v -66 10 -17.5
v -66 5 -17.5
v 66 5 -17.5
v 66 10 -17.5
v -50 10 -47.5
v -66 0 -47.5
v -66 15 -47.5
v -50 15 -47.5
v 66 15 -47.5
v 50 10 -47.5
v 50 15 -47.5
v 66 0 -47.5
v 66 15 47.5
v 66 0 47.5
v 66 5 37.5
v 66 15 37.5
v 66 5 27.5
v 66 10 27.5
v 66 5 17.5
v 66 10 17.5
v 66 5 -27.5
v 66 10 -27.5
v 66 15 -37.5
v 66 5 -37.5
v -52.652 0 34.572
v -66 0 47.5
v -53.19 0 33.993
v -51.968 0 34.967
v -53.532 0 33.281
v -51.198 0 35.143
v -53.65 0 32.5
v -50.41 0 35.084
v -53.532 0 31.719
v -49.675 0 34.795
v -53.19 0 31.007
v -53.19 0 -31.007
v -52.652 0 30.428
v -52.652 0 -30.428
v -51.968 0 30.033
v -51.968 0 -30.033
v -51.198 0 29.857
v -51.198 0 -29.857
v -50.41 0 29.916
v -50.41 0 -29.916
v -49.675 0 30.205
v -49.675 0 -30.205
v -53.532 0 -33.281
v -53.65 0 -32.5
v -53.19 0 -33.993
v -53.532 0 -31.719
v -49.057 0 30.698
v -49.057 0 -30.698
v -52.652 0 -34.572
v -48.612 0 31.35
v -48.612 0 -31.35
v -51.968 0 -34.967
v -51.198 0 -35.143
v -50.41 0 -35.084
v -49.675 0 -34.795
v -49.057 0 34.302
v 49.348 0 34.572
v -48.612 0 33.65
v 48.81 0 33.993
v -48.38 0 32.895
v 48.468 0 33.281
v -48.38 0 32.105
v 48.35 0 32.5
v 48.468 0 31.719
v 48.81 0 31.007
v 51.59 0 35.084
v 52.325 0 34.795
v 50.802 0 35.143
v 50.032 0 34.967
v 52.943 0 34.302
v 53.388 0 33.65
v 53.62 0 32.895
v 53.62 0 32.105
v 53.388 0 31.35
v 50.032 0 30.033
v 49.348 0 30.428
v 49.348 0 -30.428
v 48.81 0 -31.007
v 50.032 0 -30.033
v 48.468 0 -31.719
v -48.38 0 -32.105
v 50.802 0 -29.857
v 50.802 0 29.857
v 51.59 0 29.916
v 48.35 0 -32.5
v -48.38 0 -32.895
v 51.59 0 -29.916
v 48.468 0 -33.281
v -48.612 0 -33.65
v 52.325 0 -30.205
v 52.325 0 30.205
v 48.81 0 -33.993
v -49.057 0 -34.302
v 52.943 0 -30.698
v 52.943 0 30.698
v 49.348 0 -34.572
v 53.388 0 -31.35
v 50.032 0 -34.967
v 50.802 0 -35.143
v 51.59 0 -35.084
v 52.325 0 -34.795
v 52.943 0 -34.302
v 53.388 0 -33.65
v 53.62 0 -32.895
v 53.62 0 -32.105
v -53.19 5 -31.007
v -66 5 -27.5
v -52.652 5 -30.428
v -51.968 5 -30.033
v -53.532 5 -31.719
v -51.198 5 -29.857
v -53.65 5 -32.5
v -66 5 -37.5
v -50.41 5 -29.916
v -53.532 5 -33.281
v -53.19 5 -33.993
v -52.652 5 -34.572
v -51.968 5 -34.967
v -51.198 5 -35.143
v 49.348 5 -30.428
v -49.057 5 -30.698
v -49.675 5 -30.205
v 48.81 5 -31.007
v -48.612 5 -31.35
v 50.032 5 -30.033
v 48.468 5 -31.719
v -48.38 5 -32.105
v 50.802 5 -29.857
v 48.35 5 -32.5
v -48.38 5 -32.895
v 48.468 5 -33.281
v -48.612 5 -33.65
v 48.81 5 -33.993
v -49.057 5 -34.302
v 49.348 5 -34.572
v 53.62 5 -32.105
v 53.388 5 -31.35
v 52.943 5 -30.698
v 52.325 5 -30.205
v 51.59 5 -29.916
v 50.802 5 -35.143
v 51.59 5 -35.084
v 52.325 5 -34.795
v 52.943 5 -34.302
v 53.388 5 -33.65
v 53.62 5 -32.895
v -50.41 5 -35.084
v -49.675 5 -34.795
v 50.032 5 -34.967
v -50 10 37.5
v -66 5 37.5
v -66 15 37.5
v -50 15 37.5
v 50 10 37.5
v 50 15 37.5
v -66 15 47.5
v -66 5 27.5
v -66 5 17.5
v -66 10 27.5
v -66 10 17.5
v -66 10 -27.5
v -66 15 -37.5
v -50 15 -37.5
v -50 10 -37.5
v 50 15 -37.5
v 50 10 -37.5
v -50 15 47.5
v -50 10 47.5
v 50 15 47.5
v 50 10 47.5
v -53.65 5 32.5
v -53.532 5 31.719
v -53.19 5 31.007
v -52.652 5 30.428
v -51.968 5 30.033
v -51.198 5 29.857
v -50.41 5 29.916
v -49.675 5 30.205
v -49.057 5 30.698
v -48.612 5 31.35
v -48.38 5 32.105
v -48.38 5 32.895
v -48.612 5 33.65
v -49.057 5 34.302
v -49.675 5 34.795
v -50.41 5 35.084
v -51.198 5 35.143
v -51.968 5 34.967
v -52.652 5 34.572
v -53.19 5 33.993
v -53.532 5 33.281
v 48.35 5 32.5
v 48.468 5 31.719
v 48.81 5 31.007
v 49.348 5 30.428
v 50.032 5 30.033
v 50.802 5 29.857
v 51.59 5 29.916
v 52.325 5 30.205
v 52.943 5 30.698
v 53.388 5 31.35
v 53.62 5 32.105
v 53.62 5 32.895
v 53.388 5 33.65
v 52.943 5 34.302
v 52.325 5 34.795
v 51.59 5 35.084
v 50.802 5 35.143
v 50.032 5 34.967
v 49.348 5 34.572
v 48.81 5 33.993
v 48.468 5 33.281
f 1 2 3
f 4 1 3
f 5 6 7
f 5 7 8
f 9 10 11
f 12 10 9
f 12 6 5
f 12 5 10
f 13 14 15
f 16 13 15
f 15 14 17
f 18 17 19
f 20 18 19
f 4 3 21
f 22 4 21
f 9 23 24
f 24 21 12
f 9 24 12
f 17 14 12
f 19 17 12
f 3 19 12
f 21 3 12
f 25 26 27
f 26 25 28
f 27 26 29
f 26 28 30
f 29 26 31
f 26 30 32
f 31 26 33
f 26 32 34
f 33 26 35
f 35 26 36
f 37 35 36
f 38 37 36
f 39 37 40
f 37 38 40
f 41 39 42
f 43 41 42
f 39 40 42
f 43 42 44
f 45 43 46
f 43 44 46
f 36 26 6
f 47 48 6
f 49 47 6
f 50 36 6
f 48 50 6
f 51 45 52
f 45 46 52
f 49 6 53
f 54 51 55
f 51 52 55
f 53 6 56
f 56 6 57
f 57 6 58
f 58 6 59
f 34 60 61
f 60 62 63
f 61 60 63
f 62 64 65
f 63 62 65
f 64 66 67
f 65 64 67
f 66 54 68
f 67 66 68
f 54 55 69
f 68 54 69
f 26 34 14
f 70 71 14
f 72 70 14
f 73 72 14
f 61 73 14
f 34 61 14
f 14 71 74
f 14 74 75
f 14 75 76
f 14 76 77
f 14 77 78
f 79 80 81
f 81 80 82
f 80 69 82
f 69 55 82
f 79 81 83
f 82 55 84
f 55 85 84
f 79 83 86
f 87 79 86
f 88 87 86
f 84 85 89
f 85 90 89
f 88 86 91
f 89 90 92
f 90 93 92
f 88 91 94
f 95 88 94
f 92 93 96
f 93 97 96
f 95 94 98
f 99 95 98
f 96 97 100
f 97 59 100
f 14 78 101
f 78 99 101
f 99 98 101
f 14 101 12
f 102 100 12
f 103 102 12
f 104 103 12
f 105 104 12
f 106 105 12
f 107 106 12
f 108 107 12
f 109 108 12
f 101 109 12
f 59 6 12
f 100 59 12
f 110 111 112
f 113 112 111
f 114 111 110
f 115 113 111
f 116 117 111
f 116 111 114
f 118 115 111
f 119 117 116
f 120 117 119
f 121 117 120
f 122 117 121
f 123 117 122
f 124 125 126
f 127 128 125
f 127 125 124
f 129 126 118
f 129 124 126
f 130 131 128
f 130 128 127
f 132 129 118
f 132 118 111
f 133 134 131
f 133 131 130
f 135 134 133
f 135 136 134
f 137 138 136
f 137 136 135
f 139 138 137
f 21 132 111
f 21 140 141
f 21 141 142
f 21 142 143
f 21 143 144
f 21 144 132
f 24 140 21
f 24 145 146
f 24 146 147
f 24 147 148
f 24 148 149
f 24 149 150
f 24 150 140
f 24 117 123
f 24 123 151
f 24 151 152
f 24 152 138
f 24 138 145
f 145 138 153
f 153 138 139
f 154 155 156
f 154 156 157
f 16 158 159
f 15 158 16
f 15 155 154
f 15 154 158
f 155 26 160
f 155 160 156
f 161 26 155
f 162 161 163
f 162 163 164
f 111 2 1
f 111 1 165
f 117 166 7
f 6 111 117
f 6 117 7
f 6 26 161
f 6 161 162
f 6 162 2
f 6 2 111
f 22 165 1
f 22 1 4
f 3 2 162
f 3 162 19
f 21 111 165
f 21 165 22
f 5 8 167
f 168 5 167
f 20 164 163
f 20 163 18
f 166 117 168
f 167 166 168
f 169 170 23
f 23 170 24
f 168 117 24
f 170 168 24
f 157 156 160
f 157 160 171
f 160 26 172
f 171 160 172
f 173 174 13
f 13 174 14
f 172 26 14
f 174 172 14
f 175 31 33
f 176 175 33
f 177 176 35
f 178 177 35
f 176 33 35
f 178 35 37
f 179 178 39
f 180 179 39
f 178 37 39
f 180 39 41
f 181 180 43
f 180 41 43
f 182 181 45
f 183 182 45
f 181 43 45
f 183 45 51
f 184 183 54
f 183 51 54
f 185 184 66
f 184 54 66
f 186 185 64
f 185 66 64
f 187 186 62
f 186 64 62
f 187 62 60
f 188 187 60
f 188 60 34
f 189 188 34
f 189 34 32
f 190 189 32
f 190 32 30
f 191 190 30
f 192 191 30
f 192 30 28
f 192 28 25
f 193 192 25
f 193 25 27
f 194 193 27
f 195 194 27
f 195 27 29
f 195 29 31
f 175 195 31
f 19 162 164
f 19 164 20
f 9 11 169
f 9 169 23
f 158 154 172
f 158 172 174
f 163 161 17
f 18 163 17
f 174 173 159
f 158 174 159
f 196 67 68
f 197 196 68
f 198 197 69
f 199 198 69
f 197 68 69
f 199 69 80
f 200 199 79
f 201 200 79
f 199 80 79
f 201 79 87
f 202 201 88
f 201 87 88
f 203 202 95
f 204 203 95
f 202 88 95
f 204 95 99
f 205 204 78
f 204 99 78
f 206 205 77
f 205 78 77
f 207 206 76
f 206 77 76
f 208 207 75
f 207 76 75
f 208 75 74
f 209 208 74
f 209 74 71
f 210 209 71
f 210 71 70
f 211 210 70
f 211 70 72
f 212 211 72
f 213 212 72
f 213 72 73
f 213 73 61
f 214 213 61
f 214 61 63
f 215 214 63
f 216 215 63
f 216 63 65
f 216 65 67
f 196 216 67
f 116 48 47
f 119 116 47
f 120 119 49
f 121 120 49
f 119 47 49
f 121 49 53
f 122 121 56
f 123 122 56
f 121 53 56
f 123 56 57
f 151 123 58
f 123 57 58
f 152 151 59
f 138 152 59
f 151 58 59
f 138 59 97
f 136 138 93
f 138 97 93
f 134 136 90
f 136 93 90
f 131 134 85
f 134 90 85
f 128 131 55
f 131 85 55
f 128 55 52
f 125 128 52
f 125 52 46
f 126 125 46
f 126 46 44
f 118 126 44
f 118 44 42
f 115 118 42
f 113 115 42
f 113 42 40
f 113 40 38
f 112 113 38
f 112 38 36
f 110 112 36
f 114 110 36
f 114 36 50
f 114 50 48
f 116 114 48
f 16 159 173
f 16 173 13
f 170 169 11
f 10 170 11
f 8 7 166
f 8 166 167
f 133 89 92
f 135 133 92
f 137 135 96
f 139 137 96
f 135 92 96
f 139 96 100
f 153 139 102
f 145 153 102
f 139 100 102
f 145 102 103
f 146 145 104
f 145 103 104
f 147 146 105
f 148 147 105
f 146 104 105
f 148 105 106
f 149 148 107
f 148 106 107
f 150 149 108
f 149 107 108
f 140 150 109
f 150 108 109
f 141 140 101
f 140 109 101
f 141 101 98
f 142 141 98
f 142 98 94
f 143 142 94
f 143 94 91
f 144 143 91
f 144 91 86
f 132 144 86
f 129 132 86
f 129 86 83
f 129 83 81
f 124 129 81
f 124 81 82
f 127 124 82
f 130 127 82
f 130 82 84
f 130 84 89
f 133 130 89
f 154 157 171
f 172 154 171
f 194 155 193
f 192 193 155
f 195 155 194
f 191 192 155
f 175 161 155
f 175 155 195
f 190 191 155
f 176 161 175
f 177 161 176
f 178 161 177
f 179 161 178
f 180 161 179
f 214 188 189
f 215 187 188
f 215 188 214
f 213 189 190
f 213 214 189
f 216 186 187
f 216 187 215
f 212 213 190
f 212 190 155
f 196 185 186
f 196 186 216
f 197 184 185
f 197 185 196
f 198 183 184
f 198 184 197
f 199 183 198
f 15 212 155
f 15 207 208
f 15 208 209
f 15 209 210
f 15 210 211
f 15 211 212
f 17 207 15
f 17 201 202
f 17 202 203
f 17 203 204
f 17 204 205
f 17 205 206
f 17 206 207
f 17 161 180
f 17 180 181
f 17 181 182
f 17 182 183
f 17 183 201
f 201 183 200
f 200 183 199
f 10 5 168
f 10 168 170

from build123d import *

# Parameters (mm, degrees)
SKETCH1_W            = 132
SKETCH1_H            = 95
BOSS_EXTRUDE1_DEPTH  = 5
M5_CLEARANCE_SLOT1_D = 5.3
SKETCH4_W            = 132
SKETCH4_H            = 10
BOSS_EXTRUDE2_DEPTH  = 10
SKETCH5_W            = 100
SKETCH5_H            = 10
SKETCH5_H_2          = 2.5
SKETCH5_W_2          = 16
CUT_EXTRUDE1_DEPTH   = 5


with BuildPart() as part:
    # Sketch1 → Boss-Extrude1 (new body)
    with BuildSketch(Plane(origin=(0, 0, 0), x_dir=(1, 0, 0), z_dir=(0, 1, 0))):
        Rectangle(SKETCH1_W, SKETCH1_H)
    extrude(amount=BOSS_EXTRUDE1_DEPTH)

    # M5 Clearance Slot1 (through all)
    with Locations(Plane(origin=(0, 5, 0), x_dir=(1, 0, 0), z_dir=(0, 1, 0))):
        with Locations((-51, 32.5), (51, 32.5), (51, -32.5), (-51, -32.5)):
            Hole(M5_CLEARANCE_SLOT1_D / 2)

    # Sketch4 → Boss-Extrude2 (add)
    with BuildSketch(Plane(origin=(0, 5, 0), x_dir=(1, 0, 0), z_dir=(0, 1, 0))):
        with Locations((0, 22.5)):
            Rectangle(SKETCH4_W, SKETCH4_H)
        with Locations((0, 42.5)):
            Rectangle(SKETCH4_W, SKETCH4_H)
        with Locations((0, -22.5)):
            Rectangle(SKETCH4_W, SKETCH4_H)
        with Locations((0, -42.5)):
            Rectangle(SKETCH4_W, SKETCH4_H)
    extrude(amount=BOSS_EXTRUDE2_DEPTH)

    # Sketch5 → Cut-Extrude1 (cut)
    with BuildSketch(Plane(origin=(0, 15, 0), x_dir=(1, 0, 0), z_dir=(0, 1, 0))):
        Polygon((-50, -27.5), (-50, -37.5), (50, -37.5), (50, -27.5), (50, -17.5), (50, 17.5), (50, 27.5), (50, 50), (-50, 50), (-50, 27.5), (-50, 17.5), (-50, -17.5), align=None)
        with Locations((0, -42.5)):
            Rectangle(SKETCH5_W, SKETCH5_H)
        with Locations((0, -48.75)):
            Rectangle(SKETCH5_W, SKETCH5_H_2)
        with Locations((-58, -22.5)):
            Rectangle(SKETCH5_W_2, SKETCH5_H)
        with Locations((58, -22.5)):
            Rectangle(SKETCH5_W_2, SKETCH5_H)
        with Locations((58, 22.5)):
            Rectangle(SKETCH5_W_2, SKETCH5_H)
        with Locations((-58, 22.5)):
            Rectangle(SKETCH5_W_2, SKETCH5_H)
    extrude(amount=-CUT_EXTRUDE1_DEPTH, mode=Mode.SUBTRACT)


solid = part.part
